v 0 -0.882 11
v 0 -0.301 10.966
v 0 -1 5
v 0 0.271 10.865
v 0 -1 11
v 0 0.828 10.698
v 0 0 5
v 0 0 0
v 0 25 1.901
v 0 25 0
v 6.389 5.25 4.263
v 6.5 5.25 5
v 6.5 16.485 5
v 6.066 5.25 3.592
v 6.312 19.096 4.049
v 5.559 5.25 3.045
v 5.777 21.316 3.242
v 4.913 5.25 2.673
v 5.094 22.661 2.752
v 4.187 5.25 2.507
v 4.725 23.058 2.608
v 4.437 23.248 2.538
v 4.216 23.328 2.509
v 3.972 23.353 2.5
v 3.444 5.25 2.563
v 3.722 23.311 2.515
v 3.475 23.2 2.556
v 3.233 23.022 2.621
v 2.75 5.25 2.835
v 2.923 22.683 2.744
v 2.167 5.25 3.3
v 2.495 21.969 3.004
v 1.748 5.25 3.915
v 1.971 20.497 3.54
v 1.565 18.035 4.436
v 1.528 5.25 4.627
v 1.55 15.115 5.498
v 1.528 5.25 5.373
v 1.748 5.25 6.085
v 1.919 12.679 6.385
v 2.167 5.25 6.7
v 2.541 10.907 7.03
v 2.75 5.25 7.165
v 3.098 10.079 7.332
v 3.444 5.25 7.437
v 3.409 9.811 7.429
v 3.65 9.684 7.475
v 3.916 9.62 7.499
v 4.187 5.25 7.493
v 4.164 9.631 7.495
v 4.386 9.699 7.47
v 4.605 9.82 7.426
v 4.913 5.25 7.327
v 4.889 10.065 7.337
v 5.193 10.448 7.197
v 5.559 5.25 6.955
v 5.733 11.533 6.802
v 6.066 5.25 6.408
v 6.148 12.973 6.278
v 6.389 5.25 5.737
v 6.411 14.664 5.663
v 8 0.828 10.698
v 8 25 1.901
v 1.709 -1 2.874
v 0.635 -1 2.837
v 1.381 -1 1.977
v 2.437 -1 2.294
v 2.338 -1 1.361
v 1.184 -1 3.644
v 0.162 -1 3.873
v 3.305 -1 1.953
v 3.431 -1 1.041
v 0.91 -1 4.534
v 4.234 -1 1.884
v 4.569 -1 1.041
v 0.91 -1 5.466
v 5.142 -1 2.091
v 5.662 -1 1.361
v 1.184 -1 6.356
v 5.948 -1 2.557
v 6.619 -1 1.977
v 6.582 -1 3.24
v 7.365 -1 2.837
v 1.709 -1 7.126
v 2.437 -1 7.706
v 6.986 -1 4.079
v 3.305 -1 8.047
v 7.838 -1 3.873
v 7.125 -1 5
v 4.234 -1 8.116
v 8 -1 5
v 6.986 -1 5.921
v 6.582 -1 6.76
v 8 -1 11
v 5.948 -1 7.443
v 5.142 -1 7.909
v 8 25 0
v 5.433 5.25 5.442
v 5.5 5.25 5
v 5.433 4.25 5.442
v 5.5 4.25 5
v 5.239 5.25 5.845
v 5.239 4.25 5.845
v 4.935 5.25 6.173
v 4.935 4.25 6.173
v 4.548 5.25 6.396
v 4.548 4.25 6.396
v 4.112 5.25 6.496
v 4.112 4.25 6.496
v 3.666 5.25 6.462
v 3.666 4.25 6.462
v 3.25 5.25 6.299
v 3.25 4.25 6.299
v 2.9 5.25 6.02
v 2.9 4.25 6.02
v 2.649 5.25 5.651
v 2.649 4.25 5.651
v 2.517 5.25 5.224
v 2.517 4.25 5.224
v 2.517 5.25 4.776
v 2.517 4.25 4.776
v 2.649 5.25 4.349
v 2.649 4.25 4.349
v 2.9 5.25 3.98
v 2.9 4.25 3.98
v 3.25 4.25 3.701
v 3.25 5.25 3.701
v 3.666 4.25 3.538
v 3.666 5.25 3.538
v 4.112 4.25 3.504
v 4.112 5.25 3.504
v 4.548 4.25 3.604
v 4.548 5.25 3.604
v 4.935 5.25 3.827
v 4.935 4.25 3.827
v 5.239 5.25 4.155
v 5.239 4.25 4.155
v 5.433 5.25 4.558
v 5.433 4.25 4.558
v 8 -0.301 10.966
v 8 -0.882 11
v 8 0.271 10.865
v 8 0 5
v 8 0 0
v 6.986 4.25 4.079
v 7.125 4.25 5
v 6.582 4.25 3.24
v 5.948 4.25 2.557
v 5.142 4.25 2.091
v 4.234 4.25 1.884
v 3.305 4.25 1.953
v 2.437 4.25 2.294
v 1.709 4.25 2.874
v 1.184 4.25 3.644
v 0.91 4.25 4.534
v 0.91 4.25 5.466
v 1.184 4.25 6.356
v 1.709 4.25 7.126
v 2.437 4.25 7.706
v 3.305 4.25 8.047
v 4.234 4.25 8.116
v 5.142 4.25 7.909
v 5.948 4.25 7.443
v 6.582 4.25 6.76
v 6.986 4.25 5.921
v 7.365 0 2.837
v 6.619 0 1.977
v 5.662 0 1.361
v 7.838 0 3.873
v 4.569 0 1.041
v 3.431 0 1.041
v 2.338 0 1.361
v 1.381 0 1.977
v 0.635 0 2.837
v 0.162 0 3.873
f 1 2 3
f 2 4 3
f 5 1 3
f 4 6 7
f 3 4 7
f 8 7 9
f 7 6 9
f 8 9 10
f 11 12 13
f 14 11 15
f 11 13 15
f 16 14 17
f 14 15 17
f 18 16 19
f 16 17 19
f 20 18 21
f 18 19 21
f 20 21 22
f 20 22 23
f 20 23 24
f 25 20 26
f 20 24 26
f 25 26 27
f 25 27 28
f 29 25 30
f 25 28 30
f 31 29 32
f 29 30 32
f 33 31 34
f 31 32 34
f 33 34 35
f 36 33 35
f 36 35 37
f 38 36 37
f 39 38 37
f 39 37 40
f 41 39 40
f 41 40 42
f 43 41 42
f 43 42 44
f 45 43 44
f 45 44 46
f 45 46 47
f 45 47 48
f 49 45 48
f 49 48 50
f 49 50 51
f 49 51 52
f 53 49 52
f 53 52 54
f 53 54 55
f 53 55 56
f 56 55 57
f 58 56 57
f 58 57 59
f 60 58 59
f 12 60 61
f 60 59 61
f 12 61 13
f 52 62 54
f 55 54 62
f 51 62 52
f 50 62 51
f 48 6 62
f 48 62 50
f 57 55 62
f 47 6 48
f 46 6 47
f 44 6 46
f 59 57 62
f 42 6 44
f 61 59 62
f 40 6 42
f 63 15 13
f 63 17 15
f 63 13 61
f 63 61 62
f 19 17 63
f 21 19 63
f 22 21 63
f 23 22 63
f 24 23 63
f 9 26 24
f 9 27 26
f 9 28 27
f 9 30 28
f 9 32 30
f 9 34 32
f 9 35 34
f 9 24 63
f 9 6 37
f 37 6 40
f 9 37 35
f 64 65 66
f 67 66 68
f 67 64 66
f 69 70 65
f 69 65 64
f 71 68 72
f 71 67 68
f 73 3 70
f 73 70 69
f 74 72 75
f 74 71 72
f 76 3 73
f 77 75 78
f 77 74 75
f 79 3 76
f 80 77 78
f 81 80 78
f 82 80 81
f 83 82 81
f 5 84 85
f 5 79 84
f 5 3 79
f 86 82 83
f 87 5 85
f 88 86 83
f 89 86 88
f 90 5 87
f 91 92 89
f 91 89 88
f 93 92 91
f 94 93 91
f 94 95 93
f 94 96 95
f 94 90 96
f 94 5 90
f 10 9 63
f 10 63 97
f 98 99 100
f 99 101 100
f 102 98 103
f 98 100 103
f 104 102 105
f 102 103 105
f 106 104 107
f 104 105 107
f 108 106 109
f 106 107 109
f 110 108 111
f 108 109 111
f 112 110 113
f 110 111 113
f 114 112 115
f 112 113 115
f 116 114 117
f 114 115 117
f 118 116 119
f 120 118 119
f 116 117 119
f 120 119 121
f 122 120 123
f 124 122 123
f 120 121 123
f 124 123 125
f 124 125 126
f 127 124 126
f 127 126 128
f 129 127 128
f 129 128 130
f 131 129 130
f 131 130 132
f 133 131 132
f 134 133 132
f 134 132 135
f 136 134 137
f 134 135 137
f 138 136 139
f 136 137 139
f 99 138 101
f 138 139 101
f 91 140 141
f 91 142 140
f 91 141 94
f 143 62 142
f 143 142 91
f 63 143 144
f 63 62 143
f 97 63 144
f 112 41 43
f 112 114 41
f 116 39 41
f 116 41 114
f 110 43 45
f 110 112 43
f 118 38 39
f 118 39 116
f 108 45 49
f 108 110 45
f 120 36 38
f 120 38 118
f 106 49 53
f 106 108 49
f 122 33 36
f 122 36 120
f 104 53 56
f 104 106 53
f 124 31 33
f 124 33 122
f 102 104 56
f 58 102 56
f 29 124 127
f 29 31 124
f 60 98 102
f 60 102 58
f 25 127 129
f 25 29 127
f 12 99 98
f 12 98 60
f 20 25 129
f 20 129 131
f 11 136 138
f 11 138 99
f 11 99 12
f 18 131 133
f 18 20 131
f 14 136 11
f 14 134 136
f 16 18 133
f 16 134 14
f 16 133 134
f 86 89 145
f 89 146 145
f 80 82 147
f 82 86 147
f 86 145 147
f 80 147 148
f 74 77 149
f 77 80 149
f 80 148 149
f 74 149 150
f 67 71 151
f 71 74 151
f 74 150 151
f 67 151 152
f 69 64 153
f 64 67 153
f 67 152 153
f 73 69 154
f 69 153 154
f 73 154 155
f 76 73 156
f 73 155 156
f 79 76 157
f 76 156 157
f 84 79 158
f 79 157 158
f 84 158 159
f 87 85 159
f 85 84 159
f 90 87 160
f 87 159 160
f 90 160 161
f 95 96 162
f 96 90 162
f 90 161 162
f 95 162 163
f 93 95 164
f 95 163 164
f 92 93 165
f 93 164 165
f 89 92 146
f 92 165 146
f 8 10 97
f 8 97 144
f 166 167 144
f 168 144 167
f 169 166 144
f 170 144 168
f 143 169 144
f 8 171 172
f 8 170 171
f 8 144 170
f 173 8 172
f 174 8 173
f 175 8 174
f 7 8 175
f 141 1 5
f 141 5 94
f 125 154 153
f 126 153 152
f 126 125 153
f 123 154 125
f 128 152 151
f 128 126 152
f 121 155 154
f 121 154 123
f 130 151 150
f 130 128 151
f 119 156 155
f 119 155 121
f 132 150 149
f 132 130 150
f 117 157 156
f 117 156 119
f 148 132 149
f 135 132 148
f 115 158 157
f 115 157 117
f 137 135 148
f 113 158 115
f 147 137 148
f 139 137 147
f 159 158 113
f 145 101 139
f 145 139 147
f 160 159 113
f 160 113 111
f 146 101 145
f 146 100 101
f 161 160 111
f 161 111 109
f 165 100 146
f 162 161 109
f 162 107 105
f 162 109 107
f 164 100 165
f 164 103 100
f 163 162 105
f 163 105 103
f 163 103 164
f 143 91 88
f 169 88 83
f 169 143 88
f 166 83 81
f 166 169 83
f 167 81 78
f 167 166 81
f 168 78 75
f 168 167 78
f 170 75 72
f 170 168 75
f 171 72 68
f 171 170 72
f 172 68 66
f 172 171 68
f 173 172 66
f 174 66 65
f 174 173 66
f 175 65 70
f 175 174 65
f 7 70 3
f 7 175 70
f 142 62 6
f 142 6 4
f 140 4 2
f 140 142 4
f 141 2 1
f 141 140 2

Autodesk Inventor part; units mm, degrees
ref_plane "YZ Plane" through (0, 0, 0) normal (1, 0, 0) x (0, 1, 0)
ref_plane "XZ Plane" through (0, 0, 0) normal (0, 1, 0) x (-1, 0, 0)
ref_plane "XY Plane" through (0, 0, 0) normal (0, 0, 1) x (1, 0, 0)
sketch "Sketch1" plane through (0, 0, 0) normal (1, 0, 0) x (0, 1, 0)
  line L0 (0, 0) -> (0, 11)
  line L1 (0, 11) -> (0, 11)
  line L2 (0, 11) -> (25, 1.9007)
  line L3 (25, 1.9007) -> (25, 0)
  line L4 (25, 0) -> (0, 0)
  dimension "d0" = 11
  dimension "d1" = 160
  dimension "d2" = 25
  dimension "d4" = 0
extrude "Extrusion1" add sketch "Sketch1" along normal blind 8
sketch "Sketch2" plane through (0, 0, 0) normal (0, -1, 0) x (1, 0, 0)
  circle A0 centre (4, 5) radius 4
  line L0 (0, 11) -> (0, 0) projected
  line L1 (8, 11) -> (8, 0) projected
  line L2 (0, 0) -> (8, 0) projected
  circle A1 centre (4, 5) radius 3.125
  circle A2 centre (4, 5) radius 1.5
  line L3 (0, 11) -> (8, 11) projected
  dimension "d7" = 6.25
  dimension "d8" = 3
  dimension "d21" = 6
extrude "Extrusion2" cut sketch "Sketch2" against normal through all contours A2
extrude "Extrusion3" cut sketch "Sketch2" against normal blind 4.25 contours A1
extrude "Extrusion4" add sketch "Sketch2" along normal blind 1 contours A0
sketch "Sketch3" plane through (0, 25, 1.9007) normal (0, 1, 0) x (1, 0, 0)
  circle A0 centre (4, -3.0993) radius 2.5
  circle A1 centre (4, -3.0993) radius 1.5 projected
  point P0 (0, 1.9007)
  dimension "d15" = 5
extrude "Extrusion5" cut sketch "Sketch3" against normal blind 19.75 contours A0 | A1
sketch "Sketch5" plane through (0, 0, 11) normal (0, -1, 0) x (1, 0, 0)
  arc A0 (8, -6) -> (0, -6) centre (4, -6) ccw projected
  line L0 (8, 0) -> (8, -6) projected
  line L1 (0, 0) -> (8, 0) projected
  line L2 (0, 0) -> (0, -6) projected
  point P0 (0, -11)
extrude "Extrusion7" add sketch "Sketch5" along normal up to surface (1 mm away)
fillet "Fillet2" radius 5 1 edges at (4, 0, 11)
properties part number "rpi_stand"
